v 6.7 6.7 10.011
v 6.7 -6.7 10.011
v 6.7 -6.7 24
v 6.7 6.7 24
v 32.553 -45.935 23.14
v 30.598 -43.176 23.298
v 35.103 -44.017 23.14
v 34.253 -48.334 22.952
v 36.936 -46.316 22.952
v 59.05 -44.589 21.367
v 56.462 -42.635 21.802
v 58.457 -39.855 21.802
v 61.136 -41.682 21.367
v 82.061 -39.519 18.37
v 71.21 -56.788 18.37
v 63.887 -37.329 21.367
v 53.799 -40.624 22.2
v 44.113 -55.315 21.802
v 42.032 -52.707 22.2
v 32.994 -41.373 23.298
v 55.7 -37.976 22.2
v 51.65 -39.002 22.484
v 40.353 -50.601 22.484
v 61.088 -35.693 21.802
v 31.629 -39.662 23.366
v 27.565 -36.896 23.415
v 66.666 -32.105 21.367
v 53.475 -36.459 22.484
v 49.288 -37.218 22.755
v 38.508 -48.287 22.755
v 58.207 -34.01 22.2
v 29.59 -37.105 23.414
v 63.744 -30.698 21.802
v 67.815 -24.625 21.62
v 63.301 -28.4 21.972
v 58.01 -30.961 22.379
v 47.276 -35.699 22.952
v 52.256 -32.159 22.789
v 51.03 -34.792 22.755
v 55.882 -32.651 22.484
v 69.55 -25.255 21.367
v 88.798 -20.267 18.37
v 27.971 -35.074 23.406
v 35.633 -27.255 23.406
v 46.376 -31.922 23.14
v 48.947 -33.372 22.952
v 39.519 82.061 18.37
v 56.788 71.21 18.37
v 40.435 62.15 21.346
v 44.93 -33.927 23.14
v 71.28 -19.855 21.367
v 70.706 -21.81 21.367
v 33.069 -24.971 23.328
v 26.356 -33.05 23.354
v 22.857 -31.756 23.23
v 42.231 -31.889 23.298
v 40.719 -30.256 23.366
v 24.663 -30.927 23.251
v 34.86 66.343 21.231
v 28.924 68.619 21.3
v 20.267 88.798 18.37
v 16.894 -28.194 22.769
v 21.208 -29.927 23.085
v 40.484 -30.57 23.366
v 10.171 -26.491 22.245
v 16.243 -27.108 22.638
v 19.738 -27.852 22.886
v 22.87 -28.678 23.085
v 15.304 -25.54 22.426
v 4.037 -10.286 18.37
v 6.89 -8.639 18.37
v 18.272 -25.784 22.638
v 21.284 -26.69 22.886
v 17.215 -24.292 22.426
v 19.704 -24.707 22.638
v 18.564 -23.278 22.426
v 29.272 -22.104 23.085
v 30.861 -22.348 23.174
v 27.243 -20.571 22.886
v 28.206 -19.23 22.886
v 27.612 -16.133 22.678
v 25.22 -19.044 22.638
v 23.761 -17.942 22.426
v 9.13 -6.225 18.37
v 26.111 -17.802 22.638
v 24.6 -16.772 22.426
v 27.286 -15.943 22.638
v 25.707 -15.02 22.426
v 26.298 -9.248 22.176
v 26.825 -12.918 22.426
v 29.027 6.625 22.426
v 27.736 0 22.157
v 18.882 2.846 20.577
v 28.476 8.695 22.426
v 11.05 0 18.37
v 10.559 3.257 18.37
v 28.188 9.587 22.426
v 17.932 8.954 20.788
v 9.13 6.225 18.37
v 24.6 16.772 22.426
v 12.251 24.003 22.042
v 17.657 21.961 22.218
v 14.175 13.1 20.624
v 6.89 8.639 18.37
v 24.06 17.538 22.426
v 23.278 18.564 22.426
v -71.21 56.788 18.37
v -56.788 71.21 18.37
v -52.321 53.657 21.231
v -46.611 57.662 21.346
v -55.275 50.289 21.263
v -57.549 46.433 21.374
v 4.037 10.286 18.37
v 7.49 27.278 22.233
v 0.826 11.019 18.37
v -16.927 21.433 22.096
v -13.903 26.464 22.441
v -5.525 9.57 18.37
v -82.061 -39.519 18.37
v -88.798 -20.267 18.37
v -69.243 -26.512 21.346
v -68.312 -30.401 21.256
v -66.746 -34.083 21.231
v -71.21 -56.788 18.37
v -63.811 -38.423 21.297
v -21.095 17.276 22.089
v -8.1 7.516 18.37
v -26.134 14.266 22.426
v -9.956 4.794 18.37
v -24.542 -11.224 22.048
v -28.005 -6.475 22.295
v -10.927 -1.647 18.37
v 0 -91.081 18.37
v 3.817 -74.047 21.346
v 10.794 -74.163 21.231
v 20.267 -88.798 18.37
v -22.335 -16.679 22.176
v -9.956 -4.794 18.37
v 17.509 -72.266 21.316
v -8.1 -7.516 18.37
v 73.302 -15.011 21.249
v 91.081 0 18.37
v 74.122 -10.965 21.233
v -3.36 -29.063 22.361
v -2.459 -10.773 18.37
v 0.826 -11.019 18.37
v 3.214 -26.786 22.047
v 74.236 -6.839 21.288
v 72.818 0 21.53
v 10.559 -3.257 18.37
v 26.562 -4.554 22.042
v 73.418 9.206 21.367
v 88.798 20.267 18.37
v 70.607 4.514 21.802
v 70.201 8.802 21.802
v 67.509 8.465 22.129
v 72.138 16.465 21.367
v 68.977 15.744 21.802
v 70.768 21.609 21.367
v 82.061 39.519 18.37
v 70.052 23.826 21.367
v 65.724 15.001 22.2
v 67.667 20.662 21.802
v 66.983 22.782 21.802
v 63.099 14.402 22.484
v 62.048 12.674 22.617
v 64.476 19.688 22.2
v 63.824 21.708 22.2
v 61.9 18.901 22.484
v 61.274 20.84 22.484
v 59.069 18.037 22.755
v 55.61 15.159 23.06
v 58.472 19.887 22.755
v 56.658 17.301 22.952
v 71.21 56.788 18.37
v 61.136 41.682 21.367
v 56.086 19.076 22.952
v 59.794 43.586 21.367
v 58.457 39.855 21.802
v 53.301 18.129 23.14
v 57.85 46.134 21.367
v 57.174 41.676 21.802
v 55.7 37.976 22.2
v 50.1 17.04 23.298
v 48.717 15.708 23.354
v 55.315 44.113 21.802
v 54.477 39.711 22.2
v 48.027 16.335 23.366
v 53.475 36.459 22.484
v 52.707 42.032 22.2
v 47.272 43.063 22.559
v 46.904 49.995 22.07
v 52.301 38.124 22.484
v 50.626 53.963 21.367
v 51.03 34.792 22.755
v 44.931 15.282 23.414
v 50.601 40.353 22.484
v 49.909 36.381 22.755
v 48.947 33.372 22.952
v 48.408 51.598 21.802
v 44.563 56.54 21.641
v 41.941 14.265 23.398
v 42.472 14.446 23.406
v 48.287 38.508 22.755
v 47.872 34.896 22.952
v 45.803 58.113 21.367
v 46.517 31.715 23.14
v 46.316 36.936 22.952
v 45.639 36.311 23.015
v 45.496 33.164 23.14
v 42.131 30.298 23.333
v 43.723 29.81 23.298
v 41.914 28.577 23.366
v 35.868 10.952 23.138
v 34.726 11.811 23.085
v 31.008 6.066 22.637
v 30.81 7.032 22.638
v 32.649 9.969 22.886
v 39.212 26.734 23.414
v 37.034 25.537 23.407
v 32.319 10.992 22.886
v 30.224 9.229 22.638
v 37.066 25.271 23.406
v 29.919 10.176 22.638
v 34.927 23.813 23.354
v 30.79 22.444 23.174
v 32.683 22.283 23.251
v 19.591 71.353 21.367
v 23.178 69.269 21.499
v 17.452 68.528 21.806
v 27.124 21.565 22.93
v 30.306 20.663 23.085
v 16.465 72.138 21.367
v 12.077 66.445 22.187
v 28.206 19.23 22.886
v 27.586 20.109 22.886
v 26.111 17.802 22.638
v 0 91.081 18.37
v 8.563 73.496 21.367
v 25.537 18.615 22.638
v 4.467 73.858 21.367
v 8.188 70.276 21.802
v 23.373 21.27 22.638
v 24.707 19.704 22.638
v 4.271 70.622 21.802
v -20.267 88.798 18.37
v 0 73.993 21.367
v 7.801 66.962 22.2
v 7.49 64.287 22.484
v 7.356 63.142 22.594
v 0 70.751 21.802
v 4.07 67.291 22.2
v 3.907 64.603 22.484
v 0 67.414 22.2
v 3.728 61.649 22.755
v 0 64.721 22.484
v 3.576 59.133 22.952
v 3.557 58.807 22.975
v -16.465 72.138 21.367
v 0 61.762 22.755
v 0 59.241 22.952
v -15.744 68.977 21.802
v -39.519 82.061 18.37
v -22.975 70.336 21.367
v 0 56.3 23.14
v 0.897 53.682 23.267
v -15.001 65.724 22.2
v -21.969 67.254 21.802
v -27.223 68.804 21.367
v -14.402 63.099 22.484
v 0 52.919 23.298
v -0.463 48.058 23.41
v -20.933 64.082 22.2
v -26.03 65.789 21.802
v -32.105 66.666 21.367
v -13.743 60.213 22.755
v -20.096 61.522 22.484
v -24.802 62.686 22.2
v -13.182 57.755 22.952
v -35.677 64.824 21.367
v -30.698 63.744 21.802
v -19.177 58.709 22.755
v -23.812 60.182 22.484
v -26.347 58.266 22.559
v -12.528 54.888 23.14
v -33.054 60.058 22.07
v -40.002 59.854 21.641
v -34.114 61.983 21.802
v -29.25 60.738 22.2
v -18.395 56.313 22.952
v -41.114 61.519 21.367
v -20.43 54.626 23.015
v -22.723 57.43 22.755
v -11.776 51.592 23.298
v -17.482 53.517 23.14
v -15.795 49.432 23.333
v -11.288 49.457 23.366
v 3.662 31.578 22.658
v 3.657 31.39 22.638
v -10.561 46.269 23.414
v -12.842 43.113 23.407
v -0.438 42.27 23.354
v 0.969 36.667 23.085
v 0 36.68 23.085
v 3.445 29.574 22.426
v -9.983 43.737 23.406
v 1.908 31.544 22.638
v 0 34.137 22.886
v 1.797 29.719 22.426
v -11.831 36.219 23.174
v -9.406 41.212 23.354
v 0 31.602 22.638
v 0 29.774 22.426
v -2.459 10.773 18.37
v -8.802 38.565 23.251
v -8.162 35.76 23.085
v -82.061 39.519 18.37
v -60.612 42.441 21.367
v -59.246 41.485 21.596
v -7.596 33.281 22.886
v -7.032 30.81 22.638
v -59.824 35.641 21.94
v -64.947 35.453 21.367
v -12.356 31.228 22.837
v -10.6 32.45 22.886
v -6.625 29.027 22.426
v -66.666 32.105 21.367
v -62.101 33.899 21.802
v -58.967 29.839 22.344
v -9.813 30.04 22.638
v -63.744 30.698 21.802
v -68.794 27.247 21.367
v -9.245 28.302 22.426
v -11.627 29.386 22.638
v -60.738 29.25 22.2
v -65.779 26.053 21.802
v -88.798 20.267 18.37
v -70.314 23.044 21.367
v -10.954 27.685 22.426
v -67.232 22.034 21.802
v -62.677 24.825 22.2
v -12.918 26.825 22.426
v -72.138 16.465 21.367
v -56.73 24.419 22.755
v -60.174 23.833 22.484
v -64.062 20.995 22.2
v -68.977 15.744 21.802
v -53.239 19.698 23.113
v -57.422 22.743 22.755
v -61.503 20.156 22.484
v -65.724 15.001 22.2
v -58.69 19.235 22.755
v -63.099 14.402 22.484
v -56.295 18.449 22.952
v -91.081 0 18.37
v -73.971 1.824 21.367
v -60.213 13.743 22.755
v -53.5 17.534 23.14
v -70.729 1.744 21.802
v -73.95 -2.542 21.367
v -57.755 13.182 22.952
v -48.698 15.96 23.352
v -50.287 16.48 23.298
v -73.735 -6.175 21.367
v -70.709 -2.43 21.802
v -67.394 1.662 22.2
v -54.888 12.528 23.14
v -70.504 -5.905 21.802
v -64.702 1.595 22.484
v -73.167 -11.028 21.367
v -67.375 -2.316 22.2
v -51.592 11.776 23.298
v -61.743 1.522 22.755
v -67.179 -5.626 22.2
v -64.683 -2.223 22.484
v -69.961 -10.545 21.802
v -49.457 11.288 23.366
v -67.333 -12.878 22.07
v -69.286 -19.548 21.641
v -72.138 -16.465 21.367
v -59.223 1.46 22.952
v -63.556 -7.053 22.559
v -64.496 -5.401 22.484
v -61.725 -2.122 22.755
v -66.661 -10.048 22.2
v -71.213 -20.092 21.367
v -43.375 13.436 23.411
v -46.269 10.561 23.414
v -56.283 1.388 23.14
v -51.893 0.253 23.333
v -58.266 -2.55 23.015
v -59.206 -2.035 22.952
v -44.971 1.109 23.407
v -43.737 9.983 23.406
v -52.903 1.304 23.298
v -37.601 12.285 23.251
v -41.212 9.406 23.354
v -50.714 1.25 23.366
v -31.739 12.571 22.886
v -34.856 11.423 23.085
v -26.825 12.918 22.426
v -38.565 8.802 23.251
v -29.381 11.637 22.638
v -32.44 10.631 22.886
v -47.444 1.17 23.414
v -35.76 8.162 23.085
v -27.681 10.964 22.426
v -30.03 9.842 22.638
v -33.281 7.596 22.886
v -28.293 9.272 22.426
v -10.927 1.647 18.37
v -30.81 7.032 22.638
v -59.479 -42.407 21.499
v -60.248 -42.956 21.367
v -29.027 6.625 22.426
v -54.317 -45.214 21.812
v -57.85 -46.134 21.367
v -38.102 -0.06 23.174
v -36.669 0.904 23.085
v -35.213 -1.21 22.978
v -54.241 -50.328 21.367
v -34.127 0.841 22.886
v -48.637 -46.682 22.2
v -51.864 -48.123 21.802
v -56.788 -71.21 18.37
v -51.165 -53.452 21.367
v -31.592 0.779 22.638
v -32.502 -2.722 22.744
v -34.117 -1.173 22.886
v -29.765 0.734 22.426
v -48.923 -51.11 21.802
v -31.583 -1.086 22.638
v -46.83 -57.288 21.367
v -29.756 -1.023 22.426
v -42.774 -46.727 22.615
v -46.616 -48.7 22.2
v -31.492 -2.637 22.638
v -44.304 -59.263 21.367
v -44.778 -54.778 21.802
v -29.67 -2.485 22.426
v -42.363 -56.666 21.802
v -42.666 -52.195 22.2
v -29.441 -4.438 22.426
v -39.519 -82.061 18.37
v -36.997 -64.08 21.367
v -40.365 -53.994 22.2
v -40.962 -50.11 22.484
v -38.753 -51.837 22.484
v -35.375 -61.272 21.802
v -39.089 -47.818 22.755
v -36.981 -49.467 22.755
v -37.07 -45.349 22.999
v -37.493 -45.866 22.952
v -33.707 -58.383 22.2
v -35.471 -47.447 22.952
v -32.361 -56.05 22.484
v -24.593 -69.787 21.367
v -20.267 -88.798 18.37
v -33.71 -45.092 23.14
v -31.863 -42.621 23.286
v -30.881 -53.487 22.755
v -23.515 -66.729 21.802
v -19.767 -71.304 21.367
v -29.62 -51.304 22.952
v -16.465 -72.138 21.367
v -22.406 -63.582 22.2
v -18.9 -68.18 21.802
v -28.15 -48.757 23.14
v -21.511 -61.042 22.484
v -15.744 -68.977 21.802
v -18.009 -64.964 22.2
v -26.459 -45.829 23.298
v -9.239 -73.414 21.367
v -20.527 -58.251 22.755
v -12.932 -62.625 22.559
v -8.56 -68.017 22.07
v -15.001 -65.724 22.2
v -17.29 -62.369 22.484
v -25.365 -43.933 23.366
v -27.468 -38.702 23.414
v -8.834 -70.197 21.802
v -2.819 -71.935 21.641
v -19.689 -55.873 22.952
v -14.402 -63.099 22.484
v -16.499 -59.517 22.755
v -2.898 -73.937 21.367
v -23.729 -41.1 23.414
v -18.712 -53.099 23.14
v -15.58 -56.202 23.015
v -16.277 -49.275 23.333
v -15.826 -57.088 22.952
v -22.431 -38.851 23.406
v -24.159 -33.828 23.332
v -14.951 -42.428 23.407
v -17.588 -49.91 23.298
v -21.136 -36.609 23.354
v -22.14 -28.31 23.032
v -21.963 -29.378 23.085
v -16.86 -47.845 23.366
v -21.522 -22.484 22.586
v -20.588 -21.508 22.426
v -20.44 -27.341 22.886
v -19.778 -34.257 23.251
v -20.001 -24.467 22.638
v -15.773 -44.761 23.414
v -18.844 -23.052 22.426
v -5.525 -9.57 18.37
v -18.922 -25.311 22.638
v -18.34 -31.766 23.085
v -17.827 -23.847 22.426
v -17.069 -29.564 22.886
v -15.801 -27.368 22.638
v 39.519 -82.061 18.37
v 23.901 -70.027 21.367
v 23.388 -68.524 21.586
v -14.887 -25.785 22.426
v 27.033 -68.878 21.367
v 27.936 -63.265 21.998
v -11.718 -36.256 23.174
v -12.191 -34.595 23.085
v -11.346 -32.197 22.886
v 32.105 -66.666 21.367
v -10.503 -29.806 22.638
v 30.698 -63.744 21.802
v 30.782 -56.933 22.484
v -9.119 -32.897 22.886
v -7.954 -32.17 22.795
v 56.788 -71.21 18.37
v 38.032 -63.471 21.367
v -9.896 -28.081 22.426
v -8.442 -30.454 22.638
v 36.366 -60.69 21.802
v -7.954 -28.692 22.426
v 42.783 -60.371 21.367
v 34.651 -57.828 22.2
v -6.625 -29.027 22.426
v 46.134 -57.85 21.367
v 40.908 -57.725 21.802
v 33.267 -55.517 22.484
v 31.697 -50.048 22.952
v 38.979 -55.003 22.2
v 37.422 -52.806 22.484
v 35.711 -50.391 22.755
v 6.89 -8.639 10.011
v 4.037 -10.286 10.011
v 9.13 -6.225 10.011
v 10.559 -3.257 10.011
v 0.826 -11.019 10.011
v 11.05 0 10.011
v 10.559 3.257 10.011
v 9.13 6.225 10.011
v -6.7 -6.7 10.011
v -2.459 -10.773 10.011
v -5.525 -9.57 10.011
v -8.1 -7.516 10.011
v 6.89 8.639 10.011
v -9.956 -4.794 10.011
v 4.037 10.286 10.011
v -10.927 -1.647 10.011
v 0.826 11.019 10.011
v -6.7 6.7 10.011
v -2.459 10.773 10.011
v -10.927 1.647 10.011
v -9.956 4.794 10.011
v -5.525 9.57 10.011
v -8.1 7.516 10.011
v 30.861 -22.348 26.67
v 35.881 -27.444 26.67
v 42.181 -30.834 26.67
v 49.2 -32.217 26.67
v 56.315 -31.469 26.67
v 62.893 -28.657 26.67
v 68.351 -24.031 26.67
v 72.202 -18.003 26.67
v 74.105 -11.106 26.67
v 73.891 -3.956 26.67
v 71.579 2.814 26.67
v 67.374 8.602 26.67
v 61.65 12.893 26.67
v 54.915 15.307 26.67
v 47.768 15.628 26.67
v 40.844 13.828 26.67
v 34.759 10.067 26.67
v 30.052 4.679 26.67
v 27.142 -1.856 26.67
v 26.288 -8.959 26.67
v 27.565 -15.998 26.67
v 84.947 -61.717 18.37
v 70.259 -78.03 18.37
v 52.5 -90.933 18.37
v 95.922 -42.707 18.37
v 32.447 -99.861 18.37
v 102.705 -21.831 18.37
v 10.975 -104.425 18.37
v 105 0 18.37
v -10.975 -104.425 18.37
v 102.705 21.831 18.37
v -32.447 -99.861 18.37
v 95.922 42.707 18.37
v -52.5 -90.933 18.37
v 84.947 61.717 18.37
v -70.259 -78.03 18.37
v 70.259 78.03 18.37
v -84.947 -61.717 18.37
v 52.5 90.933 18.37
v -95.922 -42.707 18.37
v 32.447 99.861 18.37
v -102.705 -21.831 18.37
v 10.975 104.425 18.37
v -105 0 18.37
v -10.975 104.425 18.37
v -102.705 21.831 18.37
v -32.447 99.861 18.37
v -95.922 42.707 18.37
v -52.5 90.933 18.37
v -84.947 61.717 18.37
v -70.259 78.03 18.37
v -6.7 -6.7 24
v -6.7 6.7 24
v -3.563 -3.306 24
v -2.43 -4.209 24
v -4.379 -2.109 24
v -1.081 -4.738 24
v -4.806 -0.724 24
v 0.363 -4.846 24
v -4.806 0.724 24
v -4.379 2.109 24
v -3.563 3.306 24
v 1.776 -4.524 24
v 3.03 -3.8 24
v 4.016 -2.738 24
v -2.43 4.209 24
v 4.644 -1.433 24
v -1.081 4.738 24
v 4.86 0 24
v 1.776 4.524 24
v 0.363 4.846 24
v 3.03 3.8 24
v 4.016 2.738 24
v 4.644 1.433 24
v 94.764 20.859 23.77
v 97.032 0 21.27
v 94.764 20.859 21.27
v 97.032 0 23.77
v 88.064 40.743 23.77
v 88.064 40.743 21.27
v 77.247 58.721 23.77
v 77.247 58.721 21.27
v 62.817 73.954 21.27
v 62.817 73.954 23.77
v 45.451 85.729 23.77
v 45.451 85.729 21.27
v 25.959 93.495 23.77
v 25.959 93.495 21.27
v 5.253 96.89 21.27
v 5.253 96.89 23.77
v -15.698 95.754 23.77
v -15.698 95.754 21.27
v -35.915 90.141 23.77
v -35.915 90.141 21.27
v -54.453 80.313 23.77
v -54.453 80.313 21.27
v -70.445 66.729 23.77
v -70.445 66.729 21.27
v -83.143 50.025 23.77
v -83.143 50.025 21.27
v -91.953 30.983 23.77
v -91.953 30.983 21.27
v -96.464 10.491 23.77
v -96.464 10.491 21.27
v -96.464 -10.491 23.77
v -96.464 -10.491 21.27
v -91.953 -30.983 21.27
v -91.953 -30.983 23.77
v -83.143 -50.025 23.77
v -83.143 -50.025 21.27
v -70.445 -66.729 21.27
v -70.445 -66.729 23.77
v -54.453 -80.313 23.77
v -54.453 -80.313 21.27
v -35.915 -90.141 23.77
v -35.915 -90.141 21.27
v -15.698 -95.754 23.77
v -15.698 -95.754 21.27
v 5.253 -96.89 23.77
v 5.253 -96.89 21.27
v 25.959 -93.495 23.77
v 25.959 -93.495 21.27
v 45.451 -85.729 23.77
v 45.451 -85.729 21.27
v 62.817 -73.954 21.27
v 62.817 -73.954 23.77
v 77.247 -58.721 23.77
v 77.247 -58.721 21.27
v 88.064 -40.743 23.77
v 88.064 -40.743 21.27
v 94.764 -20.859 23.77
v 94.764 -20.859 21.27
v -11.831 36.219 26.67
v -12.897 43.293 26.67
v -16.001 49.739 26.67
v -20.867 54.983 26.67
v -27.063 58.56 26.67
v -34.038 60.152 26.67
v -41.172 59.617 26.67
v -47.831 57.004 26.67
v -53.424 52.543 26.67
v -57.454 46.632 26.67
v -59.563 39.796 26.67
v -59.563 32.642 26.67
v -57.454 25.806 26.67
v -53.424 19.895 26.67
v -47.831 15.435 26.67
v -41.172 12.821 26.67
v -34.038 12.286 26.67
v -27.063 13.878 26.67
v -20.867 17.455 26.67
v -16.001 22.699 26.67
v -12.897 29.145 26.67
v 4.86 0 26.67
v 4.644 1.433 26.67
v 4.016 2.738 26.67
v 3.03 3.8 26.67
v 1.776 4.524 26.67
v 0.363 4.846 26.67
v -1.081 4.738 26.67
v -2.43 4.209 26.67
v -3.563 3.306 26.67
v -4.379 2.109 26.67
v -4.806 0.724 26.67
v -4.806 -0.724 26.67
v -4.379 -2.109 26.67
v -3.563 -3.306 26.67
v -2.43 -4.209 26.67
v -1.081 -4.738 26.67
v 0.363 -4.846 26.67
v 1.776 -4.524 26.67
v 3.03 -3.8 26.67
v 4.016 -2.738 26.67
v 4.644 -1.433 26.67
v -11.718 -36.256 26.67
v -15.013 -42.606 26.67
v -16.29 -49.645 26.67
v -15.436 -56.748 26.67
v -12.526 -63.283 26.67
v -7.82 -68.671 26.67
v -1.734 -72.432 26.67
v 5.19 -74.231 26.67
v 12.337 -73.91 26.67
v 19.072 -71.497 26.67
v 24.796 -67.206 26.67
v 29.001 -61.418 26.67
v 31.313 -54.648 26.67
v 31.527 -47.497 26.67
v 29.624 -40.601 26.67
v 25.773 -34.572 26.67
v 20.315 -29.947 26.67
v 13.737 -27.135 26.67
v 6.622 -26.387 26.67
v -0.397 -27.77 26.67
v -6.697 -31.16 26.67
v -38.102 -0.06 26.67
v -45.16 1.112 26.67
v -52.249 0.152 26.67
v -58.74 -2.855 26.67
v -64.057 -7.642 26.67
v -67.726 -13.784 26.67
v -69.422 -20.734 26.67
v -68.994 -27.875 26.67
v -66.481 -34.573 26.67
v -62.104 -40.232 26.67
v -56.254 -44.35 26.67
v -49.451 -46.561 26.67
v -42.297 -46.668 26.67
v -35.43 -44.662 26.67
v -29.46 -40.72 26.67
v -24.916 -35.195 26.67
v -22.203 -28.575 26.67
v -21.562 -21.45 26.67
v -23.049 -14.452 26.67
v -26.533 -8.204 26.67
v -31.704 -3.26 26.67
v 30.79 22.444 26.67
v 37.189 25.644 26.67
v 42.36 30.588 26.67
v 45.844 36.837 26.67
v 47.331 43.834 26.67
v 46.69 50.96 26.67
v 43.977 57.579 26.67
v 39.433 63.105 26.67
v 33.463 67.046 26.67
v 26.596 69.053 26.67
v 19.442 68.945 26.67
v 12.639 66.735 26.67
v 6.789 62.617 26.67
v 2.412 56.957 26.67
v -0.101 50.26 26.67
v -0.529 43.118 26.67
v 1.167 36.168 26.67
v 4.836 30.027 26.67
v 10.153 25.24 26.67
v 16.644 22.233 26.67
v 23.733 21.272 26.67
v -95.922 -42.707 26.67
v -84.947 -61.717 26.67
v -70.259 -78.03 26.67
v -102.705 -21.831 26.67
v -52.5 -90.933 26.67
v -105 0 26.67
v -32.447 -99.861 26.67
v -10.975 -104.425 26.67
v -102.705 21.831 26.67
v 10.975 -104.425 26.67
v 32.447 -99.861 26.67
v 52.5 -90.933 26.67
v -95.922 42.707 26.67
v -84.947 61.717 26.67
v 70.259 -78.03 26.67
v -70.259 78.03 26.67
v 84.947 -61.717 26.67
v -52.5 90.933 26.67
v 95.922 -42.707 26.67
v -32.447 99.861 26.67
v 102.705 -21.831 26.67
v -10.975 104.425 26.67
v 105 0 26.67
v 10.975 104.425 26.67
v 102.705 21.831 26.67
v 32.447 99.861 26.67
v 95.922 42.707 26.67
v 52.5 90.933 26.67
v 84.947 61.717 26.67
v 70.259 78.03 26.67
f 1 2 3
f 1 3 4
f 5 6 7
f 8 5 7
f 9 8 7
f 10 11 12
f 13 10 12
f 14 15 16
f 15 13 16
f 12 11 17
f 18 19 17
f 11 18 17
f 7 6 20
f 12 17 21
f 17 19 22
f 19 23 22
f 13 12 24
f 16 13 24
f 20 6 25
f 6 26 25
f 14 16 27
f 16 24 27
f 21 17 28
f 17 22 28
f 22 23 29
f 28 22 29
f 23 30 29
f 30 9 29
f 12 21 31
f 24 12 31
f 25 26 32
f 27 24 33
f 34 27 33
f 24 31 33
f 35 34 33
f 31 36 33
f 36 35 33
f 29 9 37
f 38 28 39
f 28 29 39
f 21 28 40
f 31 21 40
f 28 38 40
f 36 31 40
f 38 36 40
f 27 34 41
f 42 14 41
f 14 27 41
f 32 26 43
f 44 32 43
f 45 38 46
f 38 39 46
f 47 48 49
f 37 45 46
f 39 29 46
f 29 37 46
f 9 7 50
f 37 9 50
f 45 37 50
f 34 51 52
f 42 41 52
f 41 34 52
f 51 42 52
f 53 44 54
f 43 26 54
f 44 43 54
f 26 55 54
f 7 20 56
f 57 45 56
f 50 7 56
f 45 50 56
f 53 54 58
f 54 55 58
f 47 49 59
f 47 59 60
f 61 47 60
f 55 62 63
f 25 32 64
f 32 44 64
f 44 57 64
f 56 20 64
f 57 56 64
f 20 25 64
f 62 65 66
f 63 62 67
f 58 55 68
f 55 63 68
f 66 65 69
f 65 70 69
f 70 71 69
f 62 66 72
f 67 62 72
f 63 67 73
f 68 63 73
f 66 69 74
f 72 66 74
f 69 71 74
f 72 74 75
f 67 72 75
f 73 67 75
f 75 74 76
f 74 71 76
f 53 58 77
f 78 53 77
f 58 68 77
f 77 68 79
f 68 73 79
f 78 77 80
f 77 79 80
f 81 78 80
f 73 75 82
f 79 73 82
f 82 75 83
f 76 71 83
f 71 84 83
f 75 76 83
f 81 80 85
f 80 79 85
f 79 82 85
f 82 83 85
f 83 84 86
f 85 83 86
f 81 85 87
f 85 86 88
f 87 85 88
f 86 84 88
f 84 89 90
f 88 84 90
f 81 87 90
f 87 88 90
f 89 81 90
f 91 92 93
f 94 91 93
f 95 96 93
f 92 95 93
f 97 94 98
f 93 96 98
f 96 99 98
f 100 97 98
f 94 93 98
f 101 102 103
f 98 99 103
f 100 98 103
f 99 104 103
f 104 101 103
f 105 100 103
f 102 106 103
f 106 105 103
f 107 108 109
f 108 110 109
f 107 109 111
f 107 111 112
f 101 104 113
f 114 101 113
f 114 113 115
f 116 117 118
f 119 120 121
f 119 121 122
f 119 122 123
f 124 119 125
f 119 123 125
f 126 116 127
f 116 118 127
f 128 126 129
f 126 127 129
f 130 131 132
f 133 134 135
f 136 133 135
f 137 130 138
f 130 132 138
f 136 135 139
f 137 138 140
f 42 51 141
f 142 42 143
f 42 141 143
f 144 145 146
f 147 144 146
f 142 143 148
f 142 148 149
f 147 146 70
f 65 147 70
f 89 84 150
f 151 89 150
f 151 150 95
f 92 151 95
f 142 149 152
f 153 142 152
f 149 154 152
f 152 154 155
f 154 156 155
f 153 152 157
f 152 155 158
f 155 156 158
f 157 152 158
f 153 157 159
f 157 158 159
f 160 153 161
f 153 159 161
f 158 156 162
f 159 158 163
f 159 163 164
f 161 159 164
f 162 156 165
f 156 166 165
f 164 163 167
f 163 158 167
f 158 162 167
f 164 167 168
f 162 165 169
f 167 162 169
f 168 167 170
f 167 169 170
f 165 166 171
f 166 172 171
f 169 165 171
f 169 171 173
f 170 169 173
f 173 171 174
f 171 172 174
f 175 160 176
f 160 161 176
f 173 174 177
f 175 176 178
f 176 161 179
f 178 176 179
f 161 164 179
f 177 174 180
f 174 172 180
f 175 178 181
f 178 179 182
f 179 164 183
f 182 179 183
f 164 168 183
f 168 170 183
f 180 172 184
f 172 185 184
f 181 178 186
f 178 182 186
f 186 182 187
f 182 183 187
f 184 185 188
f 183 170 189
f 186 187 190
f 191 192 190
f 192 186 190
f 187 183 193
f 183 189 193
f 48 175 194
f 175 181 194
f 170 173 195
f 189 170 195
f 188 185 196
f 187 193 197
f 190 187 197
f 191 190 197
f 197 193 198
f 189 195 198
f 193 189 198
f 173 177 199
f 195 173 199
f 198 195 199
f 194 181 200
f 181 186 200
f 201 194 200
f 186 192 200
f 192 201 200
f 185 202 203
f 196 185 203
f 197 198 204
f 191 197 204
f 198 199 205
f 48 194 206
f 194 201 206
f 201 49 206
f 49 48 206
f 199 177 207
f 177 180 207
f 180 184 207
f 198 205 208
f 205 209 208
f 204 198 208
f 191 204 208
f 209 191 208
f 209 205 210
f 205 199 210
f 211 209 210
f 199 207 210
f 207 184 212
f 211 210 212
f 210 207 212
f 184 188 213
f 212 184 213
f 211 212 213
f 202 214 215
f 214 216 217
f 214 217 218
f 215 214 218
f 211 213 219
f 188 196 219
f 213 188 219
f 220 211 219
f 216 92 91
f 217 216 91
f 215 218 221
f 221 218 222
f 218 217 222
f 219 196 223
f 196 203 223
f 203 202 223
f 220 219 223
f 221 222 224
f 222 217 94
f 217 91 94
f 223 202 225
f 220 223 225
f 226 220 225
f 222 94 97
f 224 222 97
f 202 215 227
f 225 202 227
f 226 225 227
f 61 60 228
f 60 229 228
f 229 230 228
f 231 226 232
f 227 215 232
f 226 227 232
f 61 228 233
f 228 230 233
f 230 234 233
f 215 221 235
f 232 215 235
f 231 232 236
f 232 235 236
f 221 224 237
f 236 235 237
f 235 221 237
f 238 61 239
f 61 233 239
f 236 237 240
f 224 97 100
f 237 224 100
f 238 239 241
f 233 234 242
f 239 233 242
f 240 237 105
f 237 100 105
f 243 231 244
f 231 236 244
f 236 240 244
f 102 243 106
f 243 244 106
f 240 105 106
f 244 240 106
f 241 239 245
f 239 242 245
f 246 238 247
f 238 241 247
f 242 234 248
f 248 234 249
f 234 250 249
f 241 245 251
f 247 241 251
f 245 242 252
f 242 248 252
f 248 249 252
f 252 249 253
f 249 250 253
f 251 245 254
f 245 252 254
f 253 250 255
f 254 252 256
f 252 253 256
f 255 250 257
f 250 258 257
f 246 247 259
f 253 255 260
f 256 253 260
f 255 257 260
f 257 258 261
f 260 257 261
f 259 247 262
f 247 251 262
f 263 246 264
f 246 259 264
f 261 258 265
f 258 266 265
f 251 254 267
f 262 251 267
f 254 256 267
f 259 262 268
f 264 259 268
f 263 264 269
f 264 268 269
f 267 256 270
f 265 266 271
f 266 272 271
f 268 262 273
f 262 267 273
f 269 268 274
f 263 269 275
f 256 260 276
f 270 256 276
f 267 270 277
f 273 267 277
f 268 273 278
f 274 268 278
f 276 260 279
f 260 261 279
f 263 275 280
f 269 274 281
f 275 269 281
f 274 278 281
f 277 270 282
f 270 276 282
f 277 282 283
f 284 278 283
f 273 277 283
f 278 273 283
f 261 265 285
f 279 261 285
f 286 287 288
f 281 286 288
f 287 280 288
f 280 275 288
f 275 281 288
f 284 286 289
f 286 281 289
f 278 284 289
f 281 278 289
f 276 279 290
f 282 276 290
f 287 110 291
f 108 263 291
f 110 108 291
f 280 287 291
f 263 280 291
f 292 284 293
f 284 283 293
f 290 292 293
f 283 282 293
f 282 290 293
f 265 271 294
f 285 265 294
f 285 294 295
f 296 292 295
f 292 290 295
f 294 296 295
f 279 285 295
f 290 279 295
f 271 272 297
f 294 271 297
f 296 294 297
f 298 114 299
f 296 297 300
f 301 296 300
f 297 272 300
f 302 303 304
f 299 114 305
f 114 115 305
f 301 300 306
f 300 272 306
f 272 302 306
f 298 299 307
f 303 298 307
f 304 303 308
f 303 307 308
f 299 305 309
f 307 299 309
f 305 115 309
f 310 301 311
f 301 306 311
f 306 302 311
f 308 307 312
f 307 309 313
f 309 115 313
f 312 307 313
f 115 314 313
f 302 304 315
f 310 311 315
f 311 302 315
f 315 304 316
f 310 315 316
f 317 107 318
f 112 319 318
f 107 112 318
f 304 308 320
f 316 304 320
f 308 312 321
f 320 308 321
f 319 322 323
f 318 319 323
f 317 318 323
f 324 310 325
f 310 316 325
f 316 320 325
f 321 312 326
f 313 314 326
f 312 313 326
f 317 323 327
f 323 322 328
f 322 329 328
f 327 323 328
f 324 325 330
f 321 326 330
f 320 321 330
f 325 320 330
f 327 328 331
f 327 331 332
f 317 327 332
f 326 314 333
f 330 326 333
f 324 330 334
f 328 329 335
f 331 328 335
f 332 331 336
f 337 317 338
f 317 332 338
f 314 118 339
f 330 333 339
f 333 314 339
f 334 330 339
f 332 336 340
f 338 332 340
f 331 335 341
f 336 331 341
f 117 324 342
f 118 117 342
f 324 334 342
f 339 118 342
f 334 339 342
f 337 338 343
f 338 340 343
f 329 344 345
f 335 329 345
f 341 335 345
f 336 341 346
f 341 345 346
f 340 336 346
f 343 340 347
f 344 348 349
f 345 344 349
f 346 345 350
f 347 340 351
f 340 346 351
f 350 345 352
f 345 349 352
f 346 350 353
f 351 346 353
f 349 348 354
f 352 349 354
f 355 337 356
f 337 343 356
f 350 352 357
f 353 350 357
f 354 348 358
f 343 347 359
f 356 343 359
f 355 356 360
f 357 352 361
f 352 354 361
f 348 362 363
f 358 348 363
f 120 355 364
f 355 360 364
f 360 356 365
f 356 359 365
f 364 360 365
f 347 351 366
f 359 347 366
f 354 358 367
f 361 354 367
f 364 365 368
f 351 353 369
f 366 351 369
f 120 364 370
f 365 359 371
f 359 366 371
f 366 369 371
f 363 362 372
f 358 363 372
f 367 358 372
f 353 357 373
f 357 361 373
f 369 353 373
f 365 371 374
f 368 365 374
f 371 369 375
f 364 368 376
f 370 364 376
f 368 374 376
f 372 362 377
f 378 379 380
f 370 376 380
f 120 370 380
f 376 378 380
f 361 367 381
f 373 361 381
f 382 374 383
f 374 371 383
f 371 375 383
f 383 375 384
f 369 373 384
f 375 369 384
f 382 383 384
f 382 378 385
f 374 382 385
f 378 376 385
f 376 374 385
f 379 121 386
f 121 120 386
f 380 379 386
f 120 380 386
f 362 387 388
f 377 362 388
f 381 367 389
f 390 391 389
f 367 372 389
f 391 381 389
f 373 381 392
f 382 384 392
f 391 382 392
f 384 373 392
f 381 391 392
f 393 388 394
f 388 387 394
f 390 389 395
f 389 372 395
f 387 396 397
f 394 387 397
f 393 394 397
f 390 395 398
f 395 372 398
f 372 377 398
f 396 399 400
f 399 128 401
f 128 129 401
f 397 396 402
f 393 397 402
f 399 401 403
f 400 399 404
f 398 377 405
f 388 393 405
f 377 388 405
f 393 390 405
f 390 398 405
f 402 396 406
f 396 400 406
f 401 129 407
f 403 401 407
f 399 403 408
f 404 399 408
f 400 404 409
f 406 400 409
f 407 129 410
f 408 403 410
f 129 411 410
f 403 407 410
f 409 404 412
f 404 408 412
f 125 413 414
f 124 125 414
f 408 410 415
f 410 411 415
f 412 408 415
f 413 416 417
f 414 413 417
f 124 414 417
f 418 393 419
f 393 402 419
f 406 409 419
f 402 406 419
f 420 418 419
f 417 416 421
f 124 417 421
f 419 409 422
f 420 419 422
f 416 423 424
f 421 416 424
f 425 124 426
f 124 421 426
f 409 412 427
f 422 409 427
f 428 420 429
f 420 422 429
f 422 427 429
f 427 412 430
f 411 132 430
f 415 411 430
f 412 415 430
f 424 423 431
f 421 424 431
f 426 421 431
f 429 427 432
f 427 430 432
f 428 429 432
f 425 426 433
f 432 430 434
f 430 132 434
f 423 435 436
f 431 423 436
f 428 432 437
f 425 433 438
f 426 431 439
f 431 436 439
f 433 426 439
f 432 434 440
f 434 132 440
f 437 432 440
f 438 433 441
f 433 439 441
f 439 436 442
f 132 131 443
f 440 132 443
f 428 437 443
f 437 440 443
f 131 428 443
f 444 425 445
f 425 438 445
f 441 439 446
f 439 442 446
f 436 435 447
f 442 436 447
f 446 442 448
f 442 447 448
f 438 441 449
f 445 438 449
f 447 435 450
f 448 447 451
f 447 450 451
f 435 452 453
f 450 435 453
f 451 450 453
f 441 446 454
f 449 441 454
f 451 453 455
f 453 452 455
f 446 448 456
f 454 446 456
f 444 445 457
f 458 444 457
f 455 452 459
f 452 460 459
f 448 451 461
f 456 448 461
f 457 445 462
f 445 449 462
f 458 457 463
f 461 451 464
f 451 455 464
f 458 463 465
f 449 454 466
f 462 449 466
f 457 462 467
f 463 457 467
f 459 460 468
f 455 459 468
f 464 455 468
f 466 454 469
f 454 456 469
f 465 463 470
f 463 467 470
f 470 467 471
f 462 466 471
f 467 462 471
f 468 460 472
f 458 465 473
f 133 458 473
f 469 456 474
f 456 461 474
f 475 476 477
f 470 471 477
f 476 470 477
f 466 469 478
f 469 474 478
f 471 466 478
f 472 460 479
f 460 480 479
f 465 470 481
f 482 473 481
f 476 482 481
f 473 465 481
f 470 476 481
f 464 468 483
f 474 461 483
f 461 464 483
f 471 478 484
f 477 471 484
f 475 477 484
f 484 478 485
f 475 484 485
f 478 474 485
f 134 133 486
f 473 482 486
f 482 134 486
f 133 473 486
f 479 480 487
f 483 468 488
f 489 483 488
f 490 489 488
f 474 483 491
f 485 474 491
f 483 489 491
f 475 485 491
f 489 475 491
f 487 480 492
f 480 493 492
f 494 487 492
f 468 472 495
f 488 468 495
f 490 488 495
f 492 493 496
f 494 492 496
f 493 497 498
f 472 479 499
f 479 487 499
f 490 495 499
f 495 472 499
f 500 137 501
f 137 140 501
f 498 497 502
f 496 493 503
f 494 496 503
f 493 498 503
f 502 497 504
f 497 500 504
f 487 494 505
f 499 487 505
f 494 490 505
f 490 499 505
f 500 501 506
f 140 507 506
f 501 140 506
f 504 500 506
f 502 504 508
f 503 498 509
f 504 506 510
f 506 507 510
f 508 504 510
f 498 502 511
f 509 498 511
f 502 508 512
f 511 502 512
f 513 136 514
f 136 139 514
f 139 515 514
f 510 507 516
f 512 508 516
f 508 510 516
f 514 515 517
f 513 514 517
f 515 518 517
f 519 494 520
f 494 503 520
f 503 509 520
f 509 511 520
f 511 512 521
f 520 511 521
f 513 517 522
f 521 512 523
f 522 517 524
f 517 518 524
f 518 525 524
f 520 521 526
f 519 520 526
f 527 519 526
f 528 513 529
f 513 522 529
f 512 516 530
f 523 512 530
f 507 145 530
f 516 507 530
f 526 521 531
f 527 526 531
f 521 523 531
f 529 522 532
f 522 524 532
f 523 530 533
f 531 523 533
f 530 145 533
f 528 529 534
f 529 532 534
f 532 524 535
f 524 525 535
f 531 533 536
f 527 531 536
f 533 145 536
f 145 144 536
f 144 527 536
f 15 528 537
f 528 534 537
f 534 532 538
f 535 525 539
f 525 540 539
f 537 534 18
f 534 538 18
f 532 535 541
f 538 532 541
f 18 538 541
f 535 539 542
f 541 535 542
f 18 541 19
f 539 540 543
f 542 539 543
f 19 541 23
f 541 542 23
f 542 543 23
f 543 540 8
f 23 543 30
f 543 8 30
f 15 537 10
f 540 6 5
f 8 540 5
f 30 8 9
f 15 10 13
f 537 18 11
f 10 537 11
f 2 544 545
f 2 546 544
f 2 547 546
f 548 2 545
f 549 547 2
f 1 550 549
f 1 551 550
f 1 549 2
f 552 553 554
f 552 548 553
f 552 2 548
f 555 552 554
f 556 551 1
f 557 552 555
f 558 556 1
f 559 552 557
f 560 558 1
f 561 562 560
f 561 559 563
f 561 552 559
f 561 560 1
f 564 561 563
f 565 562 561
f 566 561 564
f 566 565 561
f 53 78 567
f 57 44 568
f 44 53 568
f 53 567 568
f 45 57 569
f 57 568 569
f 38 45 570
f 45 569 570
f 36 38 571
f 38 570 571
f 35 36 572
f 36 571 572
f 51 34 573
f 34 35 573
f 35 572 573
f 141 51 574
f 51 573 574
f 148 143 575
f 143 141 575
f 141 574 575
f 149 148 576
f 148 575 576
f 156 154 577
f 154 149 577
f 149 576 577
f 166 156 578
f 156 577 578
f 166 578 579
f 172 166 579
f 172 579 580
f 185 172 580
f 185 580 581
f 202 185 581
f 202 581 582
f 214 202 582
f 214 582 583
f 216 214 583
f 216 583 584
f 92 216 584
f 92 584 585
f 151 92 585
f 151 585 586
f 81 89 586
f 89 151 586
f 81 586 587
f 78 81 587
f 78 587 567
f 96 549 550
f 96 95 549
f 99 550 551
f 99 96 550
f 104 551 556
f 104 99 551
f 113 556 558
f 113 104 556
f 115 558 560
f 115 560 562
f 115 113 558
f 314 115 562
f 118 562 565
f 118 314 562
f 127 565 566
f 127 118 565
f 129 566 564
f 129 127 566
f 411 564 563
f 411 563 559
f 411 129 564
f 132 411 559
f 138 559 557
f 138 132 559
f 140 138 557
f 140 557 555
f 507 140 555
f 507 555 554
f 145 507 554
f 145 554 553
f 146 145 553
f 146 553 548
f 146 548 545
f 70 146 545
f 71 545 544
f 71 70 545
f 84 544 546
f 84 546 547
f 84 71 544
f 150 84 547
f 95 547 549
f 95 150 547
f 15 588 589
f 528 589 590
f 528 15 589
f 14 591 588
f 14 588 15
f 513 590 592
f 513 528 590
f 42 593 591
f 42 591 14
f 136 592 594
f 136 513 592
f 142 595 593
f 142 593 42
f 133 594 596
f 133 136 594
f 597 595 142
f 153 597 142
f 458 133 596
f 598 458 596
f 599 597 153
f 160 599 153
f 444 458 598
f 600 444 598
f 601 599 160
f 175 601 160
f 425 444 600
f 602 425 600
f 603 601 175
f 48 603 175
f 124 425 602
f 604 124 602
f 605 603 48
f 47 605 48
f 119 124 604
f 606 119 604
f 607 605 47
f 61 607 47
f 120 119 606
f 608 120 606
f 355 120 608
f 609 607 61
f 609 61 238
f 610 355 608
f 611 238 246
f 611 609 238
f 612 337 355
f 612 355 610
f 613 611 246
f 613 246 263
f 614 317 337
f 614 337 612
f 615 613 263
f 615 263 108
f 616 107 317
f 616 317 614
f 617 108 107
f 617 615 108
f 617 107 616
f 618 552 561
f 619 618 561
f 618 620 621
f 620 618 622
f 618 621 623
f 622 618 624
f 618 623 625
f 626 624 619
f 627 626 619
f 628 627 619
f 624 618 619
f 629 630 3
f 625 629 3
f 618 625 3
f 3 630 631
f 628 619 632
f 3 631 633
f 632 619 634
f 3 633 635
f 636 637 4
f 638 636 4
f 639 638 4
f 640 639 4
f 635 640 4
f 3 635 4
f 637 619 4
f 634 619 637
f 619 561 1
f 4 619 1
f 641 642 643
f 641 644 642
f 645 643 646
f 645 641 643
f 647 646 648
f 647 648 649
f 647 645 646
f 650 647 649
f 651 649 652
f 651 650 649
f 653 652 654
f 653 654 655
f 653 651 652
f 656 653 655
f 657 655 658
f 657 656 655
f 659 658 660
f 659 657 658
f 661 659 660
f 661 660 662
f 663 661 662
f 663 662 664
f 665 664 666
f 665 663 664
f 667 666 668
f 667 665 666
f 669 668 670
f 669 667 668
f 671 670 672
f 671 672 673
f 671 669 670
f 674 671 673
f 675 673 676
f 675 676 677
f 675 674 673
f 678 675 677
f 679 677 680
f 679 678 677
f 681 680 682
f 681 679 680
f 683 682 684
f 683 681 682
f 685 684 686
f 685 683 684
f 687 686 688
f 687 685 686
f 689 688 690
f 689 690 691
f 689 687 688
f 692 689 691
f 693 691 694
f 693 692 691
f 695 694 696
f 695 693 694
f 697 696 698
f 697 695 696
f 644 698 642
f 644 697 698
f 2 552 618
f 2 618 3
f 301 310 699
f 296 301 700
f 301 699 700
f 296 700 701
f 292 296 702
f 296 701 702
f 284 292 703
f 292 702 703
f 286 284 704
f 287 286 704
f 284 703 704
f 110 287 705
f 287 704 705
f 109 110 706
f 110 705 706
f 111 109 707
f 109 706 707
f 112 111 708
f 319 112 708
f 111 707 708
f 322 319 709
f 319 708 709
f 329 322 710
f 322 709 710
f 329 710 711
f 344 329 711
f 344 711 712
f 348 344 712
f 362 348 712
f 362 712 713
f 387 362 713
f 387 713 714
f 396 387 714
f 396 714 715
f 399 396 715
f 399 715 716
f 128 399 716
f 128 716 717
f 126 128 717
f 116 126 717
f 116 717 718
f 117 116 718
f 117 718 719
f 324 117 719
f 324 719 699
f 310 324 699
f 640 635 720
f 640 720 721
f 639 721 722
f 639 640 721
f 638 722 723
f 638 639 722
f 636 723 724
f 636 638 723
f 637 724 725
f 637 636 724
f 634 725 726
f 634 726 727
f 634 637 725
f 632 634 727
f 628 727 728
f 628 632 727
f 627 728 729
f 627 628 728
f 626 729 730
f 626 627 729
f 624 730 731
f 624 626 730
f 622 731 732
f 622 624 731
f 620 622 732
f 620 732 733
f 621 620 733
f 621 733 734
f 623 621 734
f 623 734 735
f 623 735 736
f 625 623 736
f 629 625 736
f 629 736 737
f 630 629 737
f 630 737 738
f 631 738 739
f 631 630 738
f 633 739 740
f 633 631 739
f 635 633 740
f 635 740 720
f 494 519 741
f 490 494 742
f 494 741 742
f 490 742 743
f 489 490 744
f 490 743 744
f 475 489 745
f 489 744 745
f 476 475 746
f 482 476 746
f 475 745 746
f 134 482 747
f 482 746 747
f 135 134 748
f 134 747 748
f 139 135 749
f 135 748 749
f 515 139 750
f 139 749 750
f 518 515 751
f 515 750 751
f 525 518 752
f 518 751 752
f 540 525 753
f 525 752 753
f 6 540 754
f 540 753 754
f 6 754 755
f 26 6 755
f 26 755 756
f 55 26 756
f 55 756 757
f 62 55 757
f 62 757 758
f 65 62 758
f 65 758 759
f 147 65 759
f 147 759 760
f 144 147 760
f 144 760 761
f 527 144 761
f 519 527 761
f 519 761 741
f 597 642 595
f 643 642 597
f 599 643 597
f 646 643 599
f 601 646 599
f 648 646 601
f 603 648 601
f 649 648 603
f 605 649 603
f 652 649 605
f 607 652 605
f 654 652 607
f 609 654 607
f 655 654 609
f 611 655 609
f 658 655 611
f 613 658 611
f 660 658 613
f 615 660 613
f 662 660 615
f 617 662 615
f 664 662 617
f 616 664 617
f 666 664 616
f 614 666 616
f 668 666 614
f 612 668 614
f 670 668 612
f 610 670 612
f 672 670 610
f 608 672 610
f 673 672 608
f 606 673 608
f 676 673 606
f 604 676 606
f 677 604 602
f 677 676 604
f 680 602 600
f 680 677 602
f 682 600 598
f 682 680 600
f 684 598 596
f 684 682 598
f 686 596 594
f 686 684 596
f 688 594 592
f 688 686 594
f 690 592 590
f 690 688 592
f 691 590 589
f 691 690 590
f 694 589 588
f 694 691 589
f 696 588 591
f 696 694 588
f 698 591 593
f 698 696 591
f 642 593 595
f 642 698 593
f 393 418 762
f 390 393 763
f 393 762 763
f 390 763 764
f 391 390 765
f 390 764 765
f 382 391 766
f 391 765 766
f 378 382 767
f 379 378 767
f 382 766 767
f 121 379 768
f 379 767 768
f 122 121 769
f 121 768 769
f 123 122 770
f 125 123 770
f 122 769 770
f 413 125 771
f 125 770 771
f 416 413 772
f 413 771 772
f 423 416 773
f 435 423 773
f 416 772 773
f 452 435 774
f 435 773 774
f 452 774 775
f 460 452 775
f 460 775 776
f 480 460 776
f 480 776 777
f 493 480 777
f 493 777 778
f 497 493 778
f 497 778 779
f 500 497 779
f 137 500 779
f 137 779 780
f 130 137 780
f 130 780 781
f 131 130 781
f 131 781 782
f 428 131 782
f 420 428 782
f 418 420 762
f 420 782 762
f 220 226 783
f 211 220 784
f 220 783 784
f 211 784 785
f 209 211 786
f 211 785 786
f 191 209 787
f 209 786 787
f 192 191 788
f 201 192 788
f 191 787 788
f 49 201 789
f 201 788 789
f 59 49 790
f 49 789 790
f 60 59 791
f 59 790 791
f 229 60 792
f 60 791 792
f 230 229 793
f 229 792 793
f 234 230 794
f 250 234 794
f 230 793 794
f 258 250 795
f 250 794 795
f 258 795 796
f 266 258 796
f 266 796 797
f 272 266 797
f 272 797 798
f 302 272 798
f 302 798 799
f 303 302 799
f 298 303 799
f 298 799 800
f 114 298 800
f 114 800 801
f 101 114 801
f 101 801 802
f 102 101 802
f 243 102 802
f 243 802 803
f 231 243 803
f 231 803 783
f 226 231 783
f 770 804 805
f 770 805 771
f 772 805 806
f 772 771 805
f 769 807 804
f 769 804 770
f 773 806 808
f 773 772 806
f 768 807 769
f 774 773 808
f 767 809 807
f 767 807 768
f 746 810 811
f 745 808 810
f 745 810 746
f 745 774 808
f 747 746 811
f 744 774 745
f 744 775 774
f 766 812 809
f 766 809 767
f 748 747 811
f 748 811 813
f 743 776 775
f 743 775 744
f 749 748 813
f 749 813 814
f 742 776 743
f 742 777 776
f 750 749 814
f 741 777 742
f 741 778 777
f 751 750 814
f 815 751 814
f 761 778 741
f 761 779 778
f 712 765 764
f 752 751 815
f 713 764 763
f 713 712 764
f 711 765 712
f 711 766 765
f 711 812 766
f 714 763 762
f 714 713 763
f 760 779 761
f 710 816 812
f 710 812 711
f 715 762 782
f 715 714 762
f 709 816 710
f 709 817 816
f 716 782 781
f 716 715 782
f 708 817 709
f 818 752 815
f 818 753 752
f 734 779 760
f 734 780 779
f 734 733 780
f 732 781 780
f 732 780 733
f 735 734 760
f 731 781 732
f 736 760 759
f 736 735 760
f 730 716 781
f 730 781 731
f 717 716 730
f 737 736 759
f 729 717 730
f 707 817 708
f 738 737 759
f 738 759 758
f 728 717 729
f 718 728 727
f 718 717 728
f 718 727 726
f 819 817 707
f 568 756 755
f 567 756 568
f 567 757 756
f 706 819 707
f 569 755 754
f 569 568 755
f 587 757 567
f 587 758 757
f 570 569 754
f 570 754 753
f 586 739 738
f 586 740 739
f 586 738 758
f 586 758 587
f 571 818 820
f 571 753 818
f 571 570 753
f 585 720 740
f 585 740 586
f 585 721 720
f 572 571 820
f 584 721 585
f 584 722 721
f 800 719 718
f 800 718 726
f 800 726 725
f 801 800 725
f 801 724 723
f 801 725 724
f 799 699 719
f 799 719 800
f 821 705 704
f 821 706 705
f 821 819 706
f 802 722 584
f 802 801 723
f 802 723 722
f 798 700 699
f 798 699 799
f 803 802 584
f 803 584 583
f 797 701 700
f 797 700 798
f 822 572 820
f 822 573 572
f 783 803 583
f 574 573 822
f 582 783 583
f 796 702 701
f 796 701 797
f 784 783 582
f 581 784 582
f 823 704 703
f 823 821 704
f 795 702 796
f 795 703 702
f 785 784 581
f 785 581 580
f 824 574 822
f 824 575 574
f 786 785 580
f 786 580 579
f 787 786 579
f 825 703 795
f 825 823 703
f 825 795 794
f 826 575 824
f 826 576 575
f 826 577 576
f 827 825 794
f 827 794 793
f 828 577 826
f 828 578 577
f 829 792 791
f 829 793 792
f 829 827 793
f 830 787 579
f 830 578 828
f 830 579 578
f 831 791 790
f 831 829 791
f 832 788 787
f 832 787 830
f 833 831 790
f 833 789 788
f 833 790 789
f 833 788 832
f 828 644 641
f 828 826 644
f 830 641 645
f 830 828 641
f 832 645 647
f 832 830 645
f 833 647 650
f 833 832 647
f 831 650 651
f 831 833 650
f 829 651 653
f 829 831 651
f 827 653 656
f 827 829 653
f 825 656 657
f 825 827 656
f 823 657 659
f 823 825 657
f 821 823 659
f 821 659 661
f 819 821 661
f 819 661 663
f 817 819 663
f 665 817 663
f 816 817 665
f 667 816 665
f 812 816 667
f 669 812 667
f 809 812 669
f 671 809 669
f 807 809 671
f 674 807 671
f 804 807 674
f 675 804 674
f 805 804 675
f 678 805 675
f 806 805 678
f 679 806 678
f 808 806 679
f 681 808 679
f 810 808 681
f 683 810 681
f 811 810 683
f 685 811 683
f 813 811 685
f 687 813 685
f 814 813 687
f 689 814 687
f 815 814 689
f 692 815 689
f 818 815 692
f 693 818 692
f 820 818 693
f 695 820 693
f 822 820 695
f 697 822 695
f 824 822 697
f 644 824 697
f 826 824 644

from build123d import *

# Parameters (mm, degrees)
BOX_W              = 13.4
BOX_H              = 13.4
BOX_DEPTH          = 14
SKETCH001_R        = 24
POCKET_DEPTH       = 6
POLARPATTERN_COUNT = 5


with BuildPart() as cube:
    # Box → Box (new body)
    with BuildSketch(Plane(origin=(-6.7, -6.7, 10), x_dir=(1, 0, 0), z_dir=(0, 0, 1))):
        with Locations((6.7, 6.7)):
            Rectangle(BOX_W, BOX_H)
    extrude(amount=BOX_DEPTH)


with BuildPart() as body:
    # Sketch → Revolve (revolve)
    with BuildSketch(Plane.XZ):
        with BuildLine():
            Line((91.081299, 18.37), (105, 18.37))
            Line((105, 18.37), (97.032315, 21.27))
            Line((97.032315, 21.27), (97.032315, 23.77))
            Line((97.032315, 23.77), (105, 26.67))
            Line((105, 26.67), (4.86, 26.67))
            Line((4.86, 26.67), (4.86, 10.010664))
            Line((4.86, 10.010664), (11.05, 10.010664))
            Line((11.05, 10.010664), (11.05, 18.37))
            add(Edge.make_bspline(
                [(91.081299, 18.37), (58.452015, 25.146616), (31.574902, 25.049244), (11.05, 18.37)],
                knots=[0, 0, 0, 0, 1, 1, 1, 1], degree=3))
        make_face()
    revolve(axis=Axis((0, 0, 0), (0, 0, 1)))

    # Cut: cut Cube
    add(cube.part, mode=Mode.SUBTRACT)

    # Sketch001 (on Face12 of BaseFeature) → Pocket (cut)
    with BuildSketch(Plane.XY.offset(26.67)):
        with Locations((-35.831062, 36.219181)):
            Circle(SKETCH001_R)
    pocket = extrude(amount=-POCKET_DEPTH, mode=Mode.SUBTRACT)

    # PolarPattern: Pocket ×5 about axis
    polarpattern_axis = Axis((0, 0, 26.67), (0, 0, 1))
    for i in range(1, POLARPATTERN_COUNT):
        add(pocket.rotate(polarpattern_axis, i * 360 / POLARPATTERN_COUNT), mode=Mode.SUBTRACT)


solid = body.part
